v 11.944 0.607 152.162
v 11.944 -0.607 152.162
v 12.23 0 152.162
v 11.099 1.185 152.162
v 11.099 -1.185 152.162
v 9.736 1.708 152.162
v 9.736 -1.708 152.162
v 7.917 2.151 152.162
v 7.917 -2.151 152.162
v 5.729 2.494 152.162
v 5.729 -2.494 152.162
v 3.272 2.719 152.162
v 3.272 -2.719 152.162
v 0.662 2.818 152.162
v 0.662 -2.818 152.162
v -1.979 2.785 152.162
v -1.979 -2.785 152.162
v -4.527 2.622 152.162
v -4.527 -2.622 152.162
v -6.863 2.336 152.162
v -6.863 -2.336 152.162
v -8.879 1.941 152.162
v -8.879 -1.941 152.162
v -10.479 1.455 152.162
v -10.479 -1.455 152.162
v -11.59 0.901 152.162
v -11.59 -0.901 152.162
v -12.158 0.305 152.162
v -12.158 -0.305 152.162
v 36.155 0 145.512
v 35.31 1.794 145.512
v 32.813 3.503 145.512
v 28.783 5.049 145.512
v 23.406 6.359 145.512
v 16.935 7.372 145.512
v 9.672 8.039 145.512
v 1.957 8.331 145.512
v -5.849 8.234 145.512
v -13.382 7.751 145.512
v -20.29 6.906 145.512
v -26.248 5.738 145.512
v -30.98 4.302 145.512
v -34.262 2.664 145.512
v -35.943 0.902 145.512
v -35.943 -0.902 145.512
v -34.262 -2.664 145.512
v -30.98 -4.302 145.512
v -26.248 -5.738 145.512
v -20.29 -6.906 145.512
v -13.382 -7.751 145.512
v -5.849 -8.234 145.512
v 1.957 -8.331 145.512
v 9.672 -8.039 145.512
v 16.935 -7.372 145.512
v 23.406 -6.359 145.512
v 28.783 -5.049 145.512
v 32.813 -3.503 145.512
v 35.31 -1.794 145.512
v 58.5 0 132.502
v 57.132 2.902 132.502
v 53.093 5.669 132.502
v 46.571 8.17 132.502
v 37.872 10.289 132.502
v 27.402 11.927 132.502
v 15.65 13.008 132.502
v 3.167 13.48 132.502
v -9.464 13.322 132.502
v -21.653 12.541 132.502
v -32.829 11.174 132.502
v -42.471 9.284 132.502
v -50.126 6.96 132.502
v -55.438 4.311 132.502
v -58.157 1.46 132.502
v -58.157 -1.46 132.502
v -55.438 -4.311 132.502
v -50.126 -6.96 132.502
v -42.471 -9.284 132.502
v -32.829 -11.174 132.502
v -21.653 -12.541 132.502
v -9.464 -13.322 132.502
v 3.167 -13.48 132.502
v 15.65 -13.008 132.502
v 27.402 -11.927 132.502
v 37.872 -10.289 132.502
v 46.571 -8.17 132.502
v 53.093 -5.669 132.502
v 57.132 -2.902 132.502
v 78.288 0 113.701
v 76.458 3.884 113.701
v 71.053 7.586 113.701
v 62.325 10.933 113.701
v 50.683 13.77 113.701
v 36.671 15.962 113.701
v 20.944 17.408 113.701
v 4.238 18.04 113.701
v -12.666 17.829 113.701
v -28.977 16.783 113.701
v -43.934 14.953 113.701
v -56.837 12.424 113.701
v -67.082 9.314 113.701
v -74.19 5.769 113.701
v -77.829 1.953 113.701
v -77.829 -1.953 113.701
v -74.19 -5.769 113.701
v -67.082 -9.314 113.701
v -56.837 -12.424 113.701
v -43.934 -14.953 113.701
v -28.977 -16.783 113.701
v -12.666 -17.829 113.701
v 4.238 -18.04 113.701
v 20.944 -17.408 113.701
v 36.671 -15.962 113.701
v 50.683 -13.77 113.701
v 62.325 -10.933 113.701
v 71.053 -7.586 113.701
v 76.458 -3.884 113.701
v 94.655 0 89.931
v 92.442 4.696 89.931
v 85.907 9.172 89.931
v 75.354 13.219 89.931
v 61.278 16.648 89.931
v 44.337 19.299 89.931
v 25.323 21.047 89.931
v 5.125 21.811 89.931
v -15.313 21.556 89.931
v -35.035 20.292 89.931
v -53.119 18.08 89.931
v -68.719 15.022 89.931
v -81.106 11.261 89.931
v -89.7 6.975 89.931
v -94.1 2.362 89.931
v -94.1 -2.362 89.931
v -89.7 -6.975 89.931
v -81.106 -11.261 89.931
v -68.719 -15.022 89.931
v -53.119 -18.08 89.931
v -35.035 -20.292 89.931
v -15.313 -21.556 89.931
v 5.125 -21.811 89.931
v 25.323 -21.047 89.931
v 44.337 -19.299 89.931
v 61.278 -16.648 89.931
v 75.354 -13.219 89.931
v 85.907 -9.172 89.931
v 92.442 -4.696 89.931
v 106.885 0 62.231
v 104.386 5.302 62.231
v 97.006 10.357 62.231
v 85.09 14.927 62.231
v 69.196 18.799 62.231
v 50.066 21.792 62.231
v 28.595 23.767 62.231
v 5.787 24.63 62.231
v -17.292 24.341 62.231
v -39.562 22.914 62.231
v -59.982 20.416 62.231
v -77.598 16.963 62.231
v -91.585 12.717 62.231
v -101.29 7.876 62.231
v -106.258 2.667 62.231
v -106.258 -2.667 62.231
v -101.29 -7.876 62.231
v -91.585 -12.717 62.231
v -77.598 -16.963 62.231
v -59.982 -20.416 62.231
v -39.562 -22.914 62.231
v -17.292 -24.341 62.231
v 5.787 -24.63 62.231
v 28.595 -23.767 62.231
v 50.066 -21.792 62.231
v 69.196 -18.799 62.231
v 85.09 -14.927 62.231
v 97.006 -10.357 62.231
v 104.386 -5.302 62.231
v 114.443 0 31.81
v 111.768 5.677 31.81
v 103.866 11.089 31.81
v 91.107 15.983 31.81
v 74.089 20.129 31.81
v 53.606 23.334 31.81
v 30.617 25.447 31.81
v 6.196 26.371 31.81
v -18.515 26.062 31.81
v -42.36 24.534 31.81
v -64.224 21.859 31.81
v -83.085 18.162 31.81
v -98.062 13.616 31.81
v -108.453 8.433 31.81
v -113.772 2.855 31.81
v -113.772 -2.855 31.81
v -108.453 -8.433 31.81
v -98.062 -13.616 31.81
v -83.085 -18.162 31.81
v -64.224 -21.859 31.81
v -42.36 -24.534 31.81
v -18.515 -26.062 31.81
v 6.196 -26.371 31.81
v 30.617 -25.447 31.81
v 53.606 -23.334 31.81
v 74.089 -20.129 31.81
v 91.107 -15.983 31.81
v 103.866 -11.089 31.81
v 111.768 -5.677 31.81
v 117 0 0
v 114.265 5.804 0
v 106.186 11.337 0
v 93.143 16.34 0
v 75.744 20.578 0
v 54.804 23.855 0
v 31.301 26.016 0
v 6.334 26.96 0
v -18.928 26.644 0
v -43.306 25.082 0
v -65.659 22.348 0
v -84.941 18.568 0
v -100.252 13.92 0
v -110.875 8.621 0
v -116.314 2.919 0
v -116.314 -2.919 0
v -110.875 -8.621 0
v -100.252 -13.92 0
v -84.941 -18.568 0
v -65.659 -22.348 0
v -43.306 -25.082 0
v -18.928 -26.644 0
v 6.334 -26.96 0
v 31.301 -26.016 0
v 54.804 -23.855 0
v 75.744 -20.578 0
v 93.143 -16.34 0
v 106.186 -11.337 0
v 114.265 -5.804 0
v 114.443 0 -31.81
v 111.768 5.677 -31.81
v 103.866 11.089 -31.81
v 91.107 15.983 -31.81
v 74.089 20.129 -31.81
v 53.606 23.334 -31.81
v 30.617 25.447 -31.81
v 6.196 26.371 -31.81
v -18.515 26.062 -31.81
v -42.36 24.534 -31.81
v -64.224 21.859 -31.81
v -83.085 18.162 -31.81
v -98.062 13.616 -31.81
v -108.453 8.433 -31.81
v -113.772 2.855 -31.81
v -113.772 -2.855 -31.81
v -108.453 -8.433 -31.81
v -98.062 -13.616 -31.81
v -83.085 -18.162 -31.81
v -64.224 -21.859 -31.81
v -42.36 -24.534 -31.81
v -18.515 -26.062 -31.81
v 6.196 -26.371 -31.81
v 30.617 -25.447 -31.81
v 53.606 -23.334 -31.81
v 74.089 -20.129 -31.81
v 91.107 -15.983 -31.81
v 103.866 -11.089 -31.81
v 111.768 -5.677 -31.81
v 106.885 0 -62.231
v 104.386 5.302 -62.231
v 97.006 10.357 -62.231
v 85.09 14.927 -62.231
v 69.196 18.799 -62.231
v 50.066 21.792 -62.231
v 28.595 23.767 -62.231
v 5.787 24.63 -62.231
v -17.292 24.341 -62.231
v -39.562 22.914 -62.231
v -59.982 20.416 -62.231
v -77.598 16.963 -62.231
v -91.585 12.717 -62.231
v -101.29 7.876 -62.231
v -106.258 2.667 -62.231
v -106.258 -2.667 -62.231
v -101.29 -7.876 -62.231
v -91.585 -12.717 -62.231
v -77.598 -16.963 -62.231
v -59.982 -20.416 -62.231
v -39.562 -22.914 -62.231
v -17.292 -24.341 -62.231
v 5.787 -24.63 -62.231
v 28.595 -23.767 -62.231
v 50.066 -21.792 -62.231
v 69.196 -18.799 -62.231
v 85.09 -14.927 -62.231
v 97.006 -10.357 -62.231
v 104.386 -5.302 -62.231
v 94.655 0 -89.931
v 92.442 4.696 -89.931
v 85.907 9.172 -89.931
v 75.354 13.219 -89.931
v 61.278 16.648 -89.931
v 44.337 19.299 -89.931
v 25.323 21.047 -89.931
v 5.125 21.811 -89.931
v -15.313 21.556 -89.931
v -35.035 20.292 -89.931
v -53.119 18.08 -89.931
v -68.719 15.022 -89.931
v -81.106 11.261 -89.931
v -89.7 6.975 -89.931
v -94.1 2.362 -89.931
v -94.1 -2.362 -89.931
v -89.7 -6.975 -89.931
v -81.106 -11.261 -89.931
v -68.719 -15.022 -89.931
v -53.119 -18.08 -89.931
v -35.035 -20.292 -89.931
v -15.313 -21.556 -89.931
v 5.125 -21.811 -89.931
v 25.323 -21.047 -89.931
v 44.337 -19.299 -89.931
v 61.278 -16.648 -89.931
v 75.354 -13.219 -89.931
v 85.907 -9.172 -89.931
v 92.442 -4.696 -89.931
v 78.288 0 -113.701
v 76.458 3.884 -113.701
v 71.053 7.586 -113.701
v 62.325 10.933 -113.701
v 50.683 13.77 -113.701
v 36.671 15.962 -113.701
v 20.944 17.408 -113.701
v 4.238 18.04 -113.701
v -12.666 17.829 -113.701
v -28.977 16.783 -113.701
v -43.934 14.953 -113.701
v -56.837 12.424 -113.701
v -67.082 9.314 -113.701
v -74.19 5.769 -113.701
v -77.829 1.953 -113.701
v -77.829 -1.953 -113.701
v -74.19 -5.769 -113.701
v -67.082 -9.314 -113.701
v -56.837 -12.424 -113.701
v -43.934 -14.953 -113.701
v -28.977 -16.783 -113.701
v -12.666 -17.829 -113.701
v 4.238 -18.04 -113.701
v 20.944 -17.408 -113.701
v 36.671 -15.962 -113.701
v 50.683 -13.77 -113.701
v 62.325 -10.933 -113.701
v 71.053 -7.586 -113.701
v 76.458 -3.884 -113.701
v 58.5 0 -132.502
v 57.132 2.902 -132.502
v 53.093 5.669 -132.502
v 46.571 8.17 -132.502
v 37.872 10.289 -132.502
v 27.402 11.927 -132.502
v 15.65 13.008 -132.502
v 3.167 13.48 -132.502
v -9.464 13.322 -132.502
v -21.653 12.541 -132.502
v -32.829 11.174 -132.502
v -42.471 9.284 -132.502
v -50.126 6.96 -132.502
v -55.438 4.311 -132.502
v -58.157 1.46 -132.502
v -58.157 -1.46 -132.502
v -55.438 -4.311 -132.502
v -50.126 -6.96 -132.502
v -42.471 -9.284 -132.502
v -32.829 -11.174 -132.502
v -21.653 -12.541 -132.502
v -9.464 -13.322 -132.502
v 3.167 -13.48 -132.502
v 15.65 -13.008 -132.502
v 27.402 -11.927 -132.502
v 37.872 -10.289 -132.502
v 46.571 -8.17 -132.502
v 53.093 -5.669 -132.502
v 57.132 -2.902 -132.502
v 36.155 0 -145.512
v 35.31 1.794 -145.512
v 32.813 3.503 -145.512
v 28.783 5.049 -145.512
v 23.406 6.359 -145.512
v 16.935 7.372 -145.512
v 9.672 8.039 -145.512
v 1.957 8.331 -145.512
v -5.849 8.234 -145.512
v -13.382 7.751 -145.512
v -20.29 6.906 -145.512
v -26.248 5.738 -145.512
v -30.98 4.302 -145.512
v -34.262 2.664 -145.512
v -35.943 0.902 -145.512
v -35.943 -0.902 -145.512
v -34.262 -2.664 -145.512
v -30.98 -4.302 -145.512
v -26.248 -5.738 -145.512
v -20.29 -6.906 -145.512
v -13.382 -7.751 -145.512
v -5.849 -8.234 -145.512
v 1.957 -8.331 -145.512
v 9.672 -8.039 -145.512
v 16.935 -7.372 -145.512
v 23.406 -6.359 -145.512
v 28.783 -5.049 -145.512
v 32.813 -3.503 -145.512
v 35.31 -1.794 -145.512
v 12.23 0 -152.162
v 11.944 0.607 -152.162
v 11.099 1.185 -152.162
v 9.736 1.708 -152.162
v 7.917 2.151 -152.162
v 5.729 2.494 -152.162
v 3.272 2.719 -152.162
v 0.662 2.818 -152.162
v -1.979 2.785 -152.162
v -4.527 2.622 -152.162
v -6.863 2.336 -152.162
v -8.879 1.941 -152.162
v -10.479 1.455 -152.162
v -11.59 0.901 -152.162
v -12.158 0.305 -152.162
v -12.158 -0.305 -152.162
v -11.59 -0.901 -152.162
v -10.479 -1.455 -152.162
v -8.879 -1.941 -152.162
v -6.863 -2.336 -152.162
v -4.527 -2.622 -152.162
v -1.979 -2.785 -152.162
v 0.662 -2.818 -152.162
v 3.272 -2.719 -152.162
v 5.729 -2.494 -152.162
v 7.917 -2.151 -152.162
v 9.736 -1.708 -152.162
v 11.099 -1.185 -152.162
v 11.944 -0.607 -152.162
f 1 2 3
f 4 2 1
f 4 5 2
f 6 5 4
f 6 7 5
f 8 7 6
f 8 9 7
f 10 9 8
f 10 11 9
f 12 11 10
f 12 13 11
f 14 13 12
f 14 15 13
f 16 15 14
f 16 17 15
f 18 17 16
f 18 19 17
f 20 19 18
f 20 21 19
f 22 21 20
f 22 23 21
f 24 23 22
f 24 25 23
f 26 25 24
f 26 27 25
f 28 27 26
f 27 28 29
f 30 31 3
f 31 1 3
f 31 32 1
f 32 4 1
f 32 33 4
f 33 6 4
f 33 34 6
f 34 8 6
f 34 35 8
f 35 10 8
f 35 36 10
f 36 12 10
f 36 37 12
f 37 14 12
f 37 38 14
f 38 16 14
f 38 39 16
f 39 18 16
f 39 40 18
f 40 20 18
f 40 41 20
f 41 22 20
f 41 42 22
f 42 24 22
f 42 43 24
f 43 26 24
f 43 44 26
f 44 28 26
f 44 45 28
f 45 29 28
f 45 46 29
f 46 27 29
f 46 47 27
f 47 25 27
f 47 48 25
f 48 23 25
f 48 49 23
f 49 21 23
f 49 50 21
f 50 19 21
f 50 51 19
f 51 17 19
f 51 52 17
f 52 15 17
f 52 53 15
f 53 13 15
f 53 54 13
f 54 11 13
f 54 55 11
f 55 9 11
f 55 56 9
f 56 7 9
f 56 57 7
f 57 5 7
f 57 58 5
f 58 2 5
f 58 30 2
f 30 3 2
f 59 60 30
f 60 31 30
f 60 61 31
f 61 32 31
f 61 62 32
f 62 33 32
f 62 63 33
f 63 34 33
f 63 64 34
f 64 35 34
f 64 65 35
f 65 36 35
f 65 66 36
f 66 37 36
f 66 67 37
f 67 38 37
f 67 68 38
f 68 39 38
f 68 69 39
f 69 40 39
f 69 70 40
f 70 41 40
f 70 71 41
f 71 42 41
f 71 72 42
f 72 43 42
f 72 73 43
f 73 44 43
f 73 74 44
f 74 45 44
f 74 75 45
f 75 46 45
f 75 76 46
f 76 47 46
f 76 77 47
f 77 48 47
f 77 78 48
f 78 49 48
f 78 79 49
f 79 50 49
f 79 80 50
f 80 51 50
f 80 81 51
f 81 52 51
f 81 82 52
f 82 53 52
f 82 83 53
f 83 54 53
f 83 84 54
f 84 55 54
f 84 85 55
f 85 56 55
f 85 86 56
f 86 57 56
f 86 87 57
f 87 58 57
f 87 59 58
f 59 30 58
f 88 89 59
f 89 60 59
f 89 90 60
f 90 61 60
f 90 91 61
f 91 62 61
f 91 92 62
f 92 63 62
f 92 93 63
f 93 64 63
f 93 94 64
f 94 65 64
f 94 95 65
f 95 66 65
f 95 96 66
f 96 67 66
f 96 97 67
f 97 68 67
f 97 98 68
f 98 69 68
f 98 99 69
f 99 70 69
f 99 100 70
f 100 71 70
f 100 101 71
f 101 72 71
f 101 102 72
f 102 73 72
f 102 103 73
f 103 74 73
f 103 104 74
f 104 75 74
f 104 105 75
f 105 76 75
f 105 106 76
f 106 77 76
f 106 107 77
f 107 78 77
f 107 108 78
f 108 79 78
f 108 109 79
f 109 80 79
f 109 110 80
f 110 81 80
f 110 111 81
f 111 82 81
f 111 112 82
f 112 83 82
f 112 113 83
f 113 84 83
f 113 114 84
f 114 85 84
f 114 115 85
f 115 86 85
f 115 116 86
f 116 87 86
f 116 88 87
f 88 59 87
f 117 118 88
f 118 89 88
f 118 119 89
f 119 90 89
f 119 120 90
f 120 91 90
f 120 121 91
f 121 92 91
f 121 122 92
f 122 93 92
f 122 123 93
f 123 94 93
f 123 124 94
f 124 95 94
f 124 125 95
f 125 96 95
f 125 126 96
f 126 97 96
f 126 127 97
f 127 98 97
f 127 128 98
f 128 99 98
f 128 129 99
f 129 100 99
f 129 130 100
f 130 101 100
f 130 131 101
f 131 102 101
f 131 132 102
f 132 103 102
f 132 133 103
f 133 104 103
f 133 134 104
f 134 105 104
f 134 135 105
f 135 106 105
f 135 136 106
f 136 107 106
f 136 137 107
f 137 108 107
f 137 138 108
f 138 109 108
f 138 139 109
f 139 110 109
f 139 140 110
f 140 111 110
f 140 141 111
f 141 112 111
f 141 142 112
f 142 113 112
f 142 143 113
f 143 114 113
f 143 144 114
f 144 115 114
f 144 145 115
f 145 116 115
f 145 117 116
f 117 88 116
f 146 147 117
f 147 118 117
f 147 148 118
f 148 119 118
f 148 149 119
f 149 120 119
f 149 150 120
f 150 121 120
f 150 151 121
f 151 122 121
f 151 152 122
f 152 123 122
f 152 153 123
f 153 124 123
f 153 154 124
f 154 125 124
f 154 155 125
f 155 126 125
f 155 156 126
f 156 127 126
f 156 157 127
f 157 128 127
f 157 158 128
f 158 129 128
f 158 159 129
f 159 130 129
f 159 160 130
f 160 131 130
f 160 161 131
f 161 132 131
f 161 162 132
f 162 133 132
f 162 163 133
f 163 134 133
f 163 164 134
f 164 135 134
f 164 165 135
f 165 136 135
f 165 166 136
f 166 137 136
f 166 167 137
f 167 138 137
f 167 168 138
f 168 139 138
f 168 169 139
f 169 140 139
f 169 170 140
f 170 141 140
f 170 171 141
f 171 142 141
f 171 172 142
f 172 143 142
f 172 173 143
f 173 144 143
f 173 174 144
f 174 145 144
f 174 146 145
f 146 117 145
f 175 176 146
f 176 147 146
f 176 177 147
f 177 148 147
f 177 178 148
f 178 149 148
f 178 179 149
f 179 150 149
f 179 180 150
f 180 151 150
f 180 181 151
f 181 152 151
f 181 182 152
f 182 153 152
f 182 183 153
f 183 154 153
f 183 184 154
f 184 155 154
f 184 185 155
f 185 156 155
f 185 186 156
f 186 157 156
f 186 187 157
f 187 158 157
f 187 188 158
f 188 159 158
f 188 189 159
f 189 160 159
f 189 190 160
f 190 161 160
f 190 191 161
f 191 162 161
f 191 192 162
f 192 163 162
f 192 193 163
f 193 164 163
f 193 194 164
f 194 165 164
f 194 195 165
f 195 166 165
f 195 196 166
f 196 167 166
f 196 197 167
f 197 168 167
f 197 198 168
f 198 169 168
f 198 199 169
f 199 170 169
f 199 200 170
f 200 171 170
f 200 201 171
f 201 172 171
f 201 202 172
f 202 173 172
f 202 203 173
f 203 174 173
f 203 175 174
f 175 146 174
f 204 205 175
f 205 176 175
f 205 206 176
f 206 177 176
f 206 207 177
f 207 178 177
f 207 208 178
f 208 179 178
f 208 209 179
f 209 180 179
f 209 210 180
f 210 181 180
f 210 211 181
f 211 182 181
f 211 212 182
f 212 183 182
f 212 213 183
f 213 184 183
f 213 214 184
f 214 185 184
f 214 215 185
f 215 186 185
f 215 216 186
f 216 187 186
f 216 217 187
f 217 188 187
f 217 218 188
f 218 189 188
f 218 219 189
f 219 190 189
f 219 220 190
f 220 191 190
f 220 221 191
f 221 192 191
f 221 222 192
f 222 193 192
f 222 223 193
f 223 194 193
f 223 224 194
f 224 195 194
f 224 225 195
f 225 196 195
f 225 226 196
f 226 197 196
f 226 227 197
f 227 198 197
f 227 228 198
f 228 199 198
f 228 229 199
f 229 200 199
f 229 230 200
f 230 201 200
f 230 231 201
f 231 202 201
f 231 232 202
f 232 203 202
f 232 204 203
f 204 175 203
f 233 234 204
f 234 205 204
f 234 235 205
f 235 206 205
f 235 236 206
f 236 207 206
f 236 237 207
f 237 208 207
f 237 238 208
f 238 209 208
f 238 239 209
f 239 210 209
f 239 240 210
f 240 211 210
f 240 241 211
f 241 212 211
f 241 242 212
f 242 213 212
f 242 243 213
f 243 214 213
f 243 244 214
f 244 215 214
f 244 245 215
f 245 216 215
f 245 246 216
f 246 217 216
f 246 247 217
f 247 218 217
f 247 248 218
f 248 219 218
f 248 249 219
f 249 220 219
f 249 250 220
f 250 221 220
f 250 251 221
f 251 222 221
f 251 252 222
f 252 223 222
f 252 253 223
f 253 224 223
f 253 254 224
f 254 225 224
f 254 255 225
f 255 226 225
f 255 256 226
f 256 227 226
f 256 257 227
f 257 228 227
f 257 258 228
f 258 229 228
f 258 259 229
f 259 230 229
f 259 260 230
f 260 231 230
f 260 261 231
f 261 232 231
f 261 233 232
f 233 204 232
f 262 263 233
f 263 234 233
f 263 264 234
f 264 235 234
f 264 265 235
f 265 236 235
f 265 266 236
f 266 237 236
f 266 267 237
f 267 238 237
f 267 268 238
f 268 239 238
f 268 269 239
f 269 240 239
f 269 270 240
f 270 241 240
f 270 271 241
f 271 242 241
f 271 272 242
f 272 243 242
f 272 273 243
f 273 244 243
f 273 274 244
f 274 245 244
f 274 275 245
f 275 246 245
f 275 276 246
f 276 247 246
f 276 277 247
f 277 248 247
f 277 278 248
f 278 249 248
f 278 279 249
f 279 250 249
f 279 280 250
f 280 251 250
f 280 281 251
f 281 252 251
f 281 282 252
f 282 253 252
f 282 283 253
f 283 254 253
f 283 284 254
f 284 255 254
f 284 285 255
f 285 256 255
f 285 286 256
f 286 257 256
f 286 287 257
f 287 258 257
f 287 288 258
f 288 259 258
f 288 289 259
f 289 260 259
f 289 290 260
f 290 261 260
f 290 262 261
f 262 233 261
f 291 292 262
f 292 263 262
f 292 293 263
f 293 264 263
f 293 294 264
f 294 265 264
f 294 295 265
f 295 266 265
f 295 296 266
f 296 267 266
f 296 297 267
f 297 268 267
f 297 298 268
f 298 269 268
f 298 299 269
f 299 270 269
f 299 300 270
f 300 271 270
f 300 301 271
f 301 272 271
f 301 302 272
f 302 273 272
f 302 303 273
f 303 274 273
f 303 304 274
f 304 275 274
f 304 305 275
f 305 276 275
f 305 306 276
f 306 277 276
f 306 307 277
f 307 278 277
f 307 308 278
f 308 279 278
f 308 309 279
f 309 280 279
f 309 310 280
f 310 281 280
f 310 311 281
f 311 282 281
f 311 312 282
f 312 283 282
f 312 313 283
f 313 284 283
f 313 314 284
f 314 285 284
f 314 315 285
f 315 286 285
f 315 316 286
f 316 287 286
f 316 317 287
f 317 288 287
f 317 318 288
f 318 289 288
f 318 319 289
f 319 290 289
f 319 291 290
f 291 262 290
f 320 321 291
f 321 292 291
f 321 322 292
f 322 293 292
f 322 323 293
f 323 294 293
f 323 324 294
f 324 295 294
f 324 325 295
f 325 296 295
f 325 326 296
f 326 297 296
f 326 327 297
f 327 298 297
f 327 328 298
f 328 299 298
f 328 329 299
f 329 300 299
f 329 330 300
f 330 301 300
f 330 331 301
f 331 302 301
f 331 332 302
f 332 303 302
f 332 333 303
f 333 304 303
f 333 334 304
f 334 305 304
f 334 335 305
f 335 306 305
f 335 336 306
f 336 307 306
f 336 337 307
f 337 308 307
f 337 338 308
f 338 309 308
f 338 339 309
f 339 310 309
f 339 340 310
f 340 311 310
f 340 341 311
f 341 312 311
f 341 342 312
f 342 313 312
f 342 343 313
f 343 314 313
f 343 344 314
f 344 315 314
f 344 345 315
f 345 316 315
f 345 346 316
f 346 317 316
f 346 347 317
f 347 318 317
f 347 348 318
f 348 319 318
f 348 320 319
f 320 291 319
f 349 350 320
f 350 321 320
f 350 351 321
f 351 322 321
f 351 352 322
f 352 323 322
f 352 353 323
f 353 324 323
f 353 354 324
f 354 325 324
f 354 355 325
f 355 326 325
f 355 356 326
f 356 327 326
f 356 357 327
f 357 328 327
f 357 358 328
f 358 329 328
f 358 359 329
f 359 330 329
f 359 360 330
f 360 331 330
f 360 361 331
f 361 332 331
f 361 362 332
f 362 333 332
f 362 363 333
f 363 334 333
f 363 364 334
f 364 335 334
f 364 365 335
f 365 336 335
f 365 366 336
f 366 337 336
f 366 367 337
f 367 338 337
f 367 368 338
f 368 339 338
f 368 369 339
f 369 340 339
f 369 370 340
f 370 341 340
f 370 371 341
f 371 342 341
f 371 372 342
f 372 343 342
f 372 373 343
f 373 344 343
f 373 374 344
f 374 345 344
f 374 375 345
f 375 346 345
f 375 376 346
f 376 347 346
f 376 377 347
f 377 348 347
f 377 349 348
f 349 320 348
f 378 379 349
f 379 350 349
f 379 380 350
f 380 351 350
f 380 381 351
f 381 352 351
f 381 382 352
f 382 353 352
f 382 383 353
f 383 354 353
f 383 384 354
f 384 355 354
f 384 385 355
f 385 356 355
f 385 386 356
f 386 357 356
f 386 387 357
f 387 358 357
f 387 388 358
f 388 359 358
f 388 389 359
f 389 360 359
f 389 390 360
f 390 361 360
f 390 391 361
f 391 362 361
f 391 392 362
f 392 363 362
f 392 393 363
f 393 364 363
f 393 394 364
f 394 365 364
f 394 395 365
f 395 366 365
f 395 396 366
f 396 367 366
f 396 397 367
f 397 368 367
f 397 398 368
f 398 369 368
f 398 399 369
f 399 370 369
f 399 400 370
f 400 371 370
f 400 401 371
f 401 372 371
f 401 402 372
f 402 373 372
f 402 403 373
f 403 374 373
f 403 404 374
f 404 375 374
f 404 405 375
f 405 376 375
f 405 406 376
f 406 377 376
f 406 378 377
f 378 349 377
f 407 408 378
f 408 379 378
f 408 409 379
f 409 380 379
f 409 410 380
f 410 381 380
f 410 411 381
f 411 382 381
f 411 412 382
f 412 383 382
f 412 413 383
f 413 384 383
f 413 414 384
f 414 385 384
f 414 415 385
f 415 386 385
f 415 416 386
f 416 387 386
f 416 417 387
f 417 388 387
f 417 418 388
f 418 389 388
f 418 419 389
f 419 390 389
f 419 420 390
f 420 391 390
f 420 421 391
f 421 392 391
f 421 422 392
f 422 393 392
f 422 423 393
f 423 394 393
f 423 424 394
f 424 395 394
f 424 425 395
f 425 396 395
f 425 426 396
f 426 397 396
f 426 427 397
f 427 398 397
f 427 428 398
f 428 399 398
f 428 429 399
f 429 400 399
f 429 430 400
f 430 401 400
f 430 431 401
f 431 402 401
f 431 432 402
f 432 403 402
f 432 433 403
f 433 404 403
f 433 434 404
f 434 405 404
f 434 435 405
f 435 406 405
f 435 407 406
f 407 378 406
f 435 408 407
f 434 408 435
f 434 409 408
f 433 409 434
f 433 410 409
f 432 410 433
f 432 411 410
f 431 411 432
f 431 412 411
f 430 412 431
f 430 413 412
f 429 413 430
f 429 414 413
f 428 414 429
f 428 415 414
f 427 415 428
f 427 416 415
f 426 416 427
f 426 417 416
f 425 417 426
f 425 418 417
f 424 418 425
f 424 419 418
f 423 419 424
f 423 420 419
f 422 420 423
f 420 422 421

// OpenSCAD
// Generated by SolidPython 1.0.1 on 2020-07-29 00:46:50


scale(v = [13, 3, 17]) {
	sphere(r = 9);
}
/***********************************************
*********      SolidPython code:      **********
************************************************
 
# import packages: SolidPython
from solid import *
from solid.utils import *
from itertools import chain, combinations, permutations


class Resize:

    def __init__(self, scad_file):
        self.scad_file = scad_file
        #self.scad_file = import_scad(scad_file)
        # cone/cylinder param:
        self.r1 = 0
        self.r2 = 0
        self.h = 0
        # rectangular prism param:
        self.w = 0
        self.l = 0
        # ellipse param:
        self.r = 0

    # import OpenScad code (file name corresponds to shape)


    # classify shape + parameters
    def assign(self, param1, param2, param3):
        if self.scad_file == 'cone.scad':
            self.r1 = param1
            self.r2 = param2
            self.h = param3
        elif self.scad_file == 'cylinder.scad':
            self.r1 = param1
            self.r2 = param2
            self.h = param3
        elif self.scad_file == 'rectangularPrism.scad':
            self.h = param1
            self.l = param2
            self.w = param3
        else:
            self.r = param1
            self.h = param2

    # resize parameters
    def iterate(self):
        x = range(3, 20, 2)
        i = 1
        if self.scad_file == 'cone.scad':
            tempList = list(permutations(x, 2))
            for temp in tempList:
                param1 = temp[0]
                param2 = temp[1]
                filepath = 'produced_scad_files/' + 'cone' + str(param1) + '_' + str(param2) + '_' + '.scad'
                scad_render_to_file(cylinder(h=param1, r1=param2, r2=0), filepath)

        elif self.scad_file == 'cylinder.scad':
            tempList = list(permutations(x, 3))
            for temp in tempList:
                param1 = temp[0]
                param2 = temp[1]
                filepath = 'produced_scad_files/' + 'cylinder' + str(param1) + '_' + str(param2) + '_' + '.scad'
                scad_render_to_file(cylinder(h=param1, r1=param2, r2=param2), filepath)

        elif self.scad_file == 'rectangularPrism.scad':
            tempList = list(permutations(x, 3))
            for temp in tempList:
                param1 = temp[0]
                param2 = temp[1]
                param3 = temp[2]
                filepath = 'produced_scad_files/' + 'rectangularPrism' + str(param1) + '_' + str(param2) + '_' + str(
                    param3) + '.scad'
                scad_render_to_file(cube(size=(param1, param2, param3)), filepath)

        elif self.scad_file == 'ellipse.scad':
            tempList = list(permutations(x, 4))
            for temp in tempList:
                param1 = temp[0]
                param2 = temp[1]
                param3 = temp[2]
                param4 = temp[3]
                filepath = 'produced_scad_files/' + 'ellipse' + str(param1) + '_' + str(param2) + '_' + str(param3) + '_' + str(param4) + '.scad'
                scad_render_to_file(scale([param1, param2, param3])(sphere(r=param4)), filepath)

    def render_to_scadfile(self):
        scad_render_to_file(scad, 'example.scad') 
 
************************************************/
